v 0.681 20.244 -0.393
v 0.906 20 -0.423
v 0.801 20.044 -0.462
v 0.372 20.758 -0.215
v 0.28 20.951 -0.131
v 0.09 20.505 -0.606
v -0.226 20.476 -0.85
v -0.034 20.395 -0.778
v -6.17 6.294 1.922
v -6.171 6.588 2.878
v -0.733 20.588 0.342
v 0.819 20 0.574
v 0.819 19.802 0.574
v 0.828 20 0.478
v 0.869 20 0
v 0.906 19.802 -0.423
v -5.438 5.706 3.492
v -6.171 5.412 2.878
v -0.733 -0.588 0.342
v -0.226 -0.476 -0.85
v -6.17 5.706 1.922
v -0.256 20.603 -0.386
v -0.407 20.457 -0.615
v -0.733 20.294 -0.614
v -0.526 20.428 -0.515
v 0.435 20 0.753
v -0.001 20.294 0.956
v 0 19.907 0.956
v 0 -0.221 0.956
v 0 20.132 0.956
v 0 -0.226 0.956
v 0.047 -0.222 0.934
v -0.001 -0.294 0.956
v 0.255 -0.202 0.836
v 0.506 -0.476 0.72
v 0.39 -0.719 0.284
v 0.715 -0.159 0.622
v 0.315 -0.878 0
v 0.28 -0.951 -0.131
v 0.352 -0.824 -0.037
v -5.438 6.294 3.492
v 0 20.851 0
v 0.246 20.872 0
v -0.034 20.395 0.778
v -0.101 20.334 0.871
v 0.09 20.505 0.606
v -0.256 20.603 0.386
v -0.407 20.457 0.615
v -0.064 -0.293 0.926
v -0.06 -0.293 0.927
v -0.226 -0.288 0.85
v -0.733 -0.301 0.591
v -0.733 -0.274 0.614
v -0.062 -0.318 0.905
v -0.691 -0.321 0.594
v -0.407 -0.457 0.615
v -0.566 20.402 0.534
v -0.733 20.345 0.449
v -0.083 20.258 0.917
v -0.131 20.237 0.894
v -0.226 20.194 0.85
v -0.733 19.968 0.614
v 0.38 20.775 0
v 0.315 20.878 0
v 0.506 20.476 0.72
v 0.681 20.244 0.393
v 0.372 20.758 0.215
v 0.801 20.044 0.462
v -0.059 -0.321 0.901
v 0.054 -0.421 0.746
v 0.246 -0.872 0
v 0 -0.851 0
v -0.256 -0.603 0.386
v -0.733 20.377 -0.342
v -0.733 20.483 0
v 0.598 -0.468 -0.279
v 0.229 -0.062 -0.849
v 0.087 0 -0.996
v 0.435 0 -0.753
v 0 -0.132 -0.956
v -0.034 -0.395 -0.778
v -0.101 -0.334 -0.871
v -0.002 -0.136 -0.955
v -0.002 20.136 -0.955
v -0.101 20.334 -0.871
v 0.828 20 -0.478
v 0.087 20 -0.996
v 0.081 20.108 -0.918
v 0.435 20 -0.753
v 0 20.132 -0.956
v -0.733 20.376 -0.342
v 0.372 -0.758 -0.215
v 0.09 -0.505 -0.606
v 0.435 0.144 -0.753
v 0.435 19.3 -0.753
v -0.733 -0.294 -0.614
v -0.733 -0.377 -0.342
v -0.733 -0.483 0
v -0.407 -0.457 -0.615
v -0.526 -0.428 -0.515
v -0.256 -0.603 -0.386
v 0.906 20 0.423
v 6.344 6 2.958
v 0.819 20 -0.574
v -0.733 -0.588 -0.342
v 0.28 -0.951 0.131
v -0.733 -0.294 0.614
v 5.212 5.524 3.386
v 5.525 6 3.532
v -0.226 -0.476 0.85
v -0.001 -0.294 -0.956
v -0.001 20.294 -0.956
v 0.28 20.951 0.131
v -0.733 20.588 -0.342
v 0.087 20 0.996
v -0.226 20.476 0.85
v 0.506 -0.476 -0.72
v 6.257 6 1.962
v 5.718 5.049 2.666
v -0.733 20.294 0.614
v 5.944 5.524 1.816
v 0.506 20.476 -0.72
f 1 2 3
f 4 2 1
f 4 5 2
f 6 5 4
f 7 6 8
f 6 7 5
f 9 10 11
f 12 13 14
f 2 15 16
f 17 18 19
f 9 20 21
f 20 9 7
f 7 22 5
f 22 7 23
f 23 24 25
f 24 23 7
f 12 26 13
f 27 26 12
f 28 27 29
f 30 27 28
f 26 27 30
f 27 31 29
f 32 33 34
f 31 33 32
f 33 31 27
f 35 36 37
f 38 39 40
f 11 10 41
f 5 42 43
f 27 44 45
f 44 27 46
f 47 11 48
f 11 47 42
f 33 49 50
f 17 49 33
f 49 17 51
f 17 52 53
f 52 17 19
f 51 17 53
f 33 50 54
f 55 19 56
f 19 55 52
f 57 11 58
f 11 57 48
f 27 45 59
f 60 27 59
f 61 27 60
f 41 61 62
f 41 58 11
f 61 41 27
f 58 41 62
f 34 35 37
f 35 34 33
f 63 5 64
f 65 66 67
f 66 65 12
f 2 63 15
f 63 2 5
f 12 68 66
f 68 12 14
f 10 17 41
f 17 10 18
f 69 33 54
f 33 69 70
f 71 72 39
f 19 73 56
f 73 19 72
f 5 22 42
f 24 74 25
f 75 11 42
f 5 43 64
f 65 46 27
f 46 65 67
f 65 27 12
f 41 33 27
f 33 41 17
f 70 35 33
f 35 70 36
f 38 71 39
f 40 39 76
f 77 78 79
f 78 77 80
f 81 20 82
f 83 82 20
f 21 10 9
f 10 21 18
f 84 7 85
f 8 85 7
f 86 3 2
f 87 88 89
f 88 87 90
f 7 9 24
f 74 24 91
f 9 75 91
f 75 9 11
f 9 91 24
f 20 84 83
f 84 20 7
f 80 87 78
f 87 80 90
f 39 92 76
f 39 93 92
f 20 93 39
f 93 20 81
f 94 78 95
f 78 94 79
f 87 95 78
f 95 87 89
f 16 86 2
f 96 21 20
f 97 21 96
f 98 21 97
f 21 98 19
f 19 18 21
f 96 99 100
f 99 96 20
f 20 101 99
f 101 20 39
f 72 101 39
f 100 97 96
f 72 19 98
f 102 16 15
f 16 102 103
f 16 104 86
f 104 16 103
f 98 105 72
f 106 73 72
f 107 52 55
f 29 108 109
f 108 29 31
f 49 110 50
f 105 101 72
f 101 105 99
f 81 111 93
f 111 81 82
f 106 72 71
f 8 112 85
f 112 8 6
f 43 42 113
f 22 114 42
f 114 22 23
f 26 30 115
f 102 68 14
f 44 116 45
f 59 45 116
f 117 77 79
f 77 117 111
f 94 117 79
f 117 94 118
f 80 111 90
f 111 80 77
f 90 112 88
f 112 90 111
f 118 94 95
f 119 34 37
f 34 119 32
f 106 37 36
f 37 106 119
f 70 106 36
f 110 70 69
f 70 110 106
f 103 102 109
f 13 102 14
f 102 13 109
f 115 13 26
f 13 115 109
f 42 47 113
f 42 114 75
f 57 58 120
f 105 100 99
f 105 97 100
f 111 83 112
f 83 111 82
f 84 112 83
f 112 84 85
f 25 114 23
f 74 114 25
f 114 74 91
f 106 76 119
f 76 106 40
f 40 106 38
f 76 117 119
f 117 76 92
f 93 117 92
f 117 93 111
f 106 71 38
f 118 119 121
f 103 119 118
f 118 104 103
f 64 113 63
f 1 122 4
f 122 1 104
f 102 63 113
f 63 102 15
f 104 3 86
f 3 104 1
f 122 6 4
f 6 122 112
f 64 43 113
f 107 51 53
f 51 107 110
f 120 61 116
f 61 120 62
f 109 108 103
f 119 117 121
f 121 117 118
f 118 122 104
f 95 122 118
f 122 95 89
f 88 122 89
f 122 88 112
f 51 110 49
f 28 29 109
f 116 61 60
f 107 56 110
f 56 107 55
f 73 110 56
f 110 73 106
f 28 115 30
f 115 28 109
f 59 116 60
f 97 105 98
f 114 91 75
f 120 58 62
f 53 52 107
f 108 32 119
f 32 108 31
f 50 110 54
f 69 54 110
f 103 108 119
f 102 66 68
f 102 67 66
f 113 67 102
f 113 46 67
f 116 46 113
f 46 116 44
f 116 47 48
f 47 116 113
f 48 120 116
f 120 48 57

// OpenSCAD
union() {
	rotate(a = 25, v = [0, 1, 0]) {
		hull() {
			translate(v = [0, 0, 0]) {
				sphere(r = 1);
			}
			translate(v = [-6, 6, 0]) {
				sphere(r = 1);
			}
			translate(v = [0, 20, 0]) {
				sphere(r = 1);
			}
		}
	}
	rotate(a = -25, v = [0, 1, 0]) {
		hull() {
			translate(v = [0, 0, 0]) {
				sphere(r = 1);
			}
			translate(v = [6, 6, 0]) {
				sphere(r = 1);
			}
			translate(v = [0, 20, 0]) {
				sphere(r = 1);
			}
		}
	}
}
/***********************************************
******      SolidPython code:      *************
************************************************
 
from solid import *
import random
import sys
from math import *
from random import *

sys.path.append( "../../../" )
from zack.lib.mat import *
from zack.lib.pathmat import *


leaf = union()(
	rotate( +25, [0,1,0] )( hull()(
		translate( [0,0,0] )( sphere(r=1) ),
		translate( [-6,6,0] )( sphere(r=1) ),
		translate( [0,20,0] )( sphere(r=1) )
	)),
	rotate( -25, [0,1,0] )( hull()(
		translate( [0,0,0] )( sphere(r=1) ),
		translate( [+6,6,0] )( sphere(r=1) ),
		translate( [0,20,0] )( sphere(r=1) )
	))
)




scad_render_to_file(
	leaf, "leafy.scad"
)


 
 
***********************************************/
                            
